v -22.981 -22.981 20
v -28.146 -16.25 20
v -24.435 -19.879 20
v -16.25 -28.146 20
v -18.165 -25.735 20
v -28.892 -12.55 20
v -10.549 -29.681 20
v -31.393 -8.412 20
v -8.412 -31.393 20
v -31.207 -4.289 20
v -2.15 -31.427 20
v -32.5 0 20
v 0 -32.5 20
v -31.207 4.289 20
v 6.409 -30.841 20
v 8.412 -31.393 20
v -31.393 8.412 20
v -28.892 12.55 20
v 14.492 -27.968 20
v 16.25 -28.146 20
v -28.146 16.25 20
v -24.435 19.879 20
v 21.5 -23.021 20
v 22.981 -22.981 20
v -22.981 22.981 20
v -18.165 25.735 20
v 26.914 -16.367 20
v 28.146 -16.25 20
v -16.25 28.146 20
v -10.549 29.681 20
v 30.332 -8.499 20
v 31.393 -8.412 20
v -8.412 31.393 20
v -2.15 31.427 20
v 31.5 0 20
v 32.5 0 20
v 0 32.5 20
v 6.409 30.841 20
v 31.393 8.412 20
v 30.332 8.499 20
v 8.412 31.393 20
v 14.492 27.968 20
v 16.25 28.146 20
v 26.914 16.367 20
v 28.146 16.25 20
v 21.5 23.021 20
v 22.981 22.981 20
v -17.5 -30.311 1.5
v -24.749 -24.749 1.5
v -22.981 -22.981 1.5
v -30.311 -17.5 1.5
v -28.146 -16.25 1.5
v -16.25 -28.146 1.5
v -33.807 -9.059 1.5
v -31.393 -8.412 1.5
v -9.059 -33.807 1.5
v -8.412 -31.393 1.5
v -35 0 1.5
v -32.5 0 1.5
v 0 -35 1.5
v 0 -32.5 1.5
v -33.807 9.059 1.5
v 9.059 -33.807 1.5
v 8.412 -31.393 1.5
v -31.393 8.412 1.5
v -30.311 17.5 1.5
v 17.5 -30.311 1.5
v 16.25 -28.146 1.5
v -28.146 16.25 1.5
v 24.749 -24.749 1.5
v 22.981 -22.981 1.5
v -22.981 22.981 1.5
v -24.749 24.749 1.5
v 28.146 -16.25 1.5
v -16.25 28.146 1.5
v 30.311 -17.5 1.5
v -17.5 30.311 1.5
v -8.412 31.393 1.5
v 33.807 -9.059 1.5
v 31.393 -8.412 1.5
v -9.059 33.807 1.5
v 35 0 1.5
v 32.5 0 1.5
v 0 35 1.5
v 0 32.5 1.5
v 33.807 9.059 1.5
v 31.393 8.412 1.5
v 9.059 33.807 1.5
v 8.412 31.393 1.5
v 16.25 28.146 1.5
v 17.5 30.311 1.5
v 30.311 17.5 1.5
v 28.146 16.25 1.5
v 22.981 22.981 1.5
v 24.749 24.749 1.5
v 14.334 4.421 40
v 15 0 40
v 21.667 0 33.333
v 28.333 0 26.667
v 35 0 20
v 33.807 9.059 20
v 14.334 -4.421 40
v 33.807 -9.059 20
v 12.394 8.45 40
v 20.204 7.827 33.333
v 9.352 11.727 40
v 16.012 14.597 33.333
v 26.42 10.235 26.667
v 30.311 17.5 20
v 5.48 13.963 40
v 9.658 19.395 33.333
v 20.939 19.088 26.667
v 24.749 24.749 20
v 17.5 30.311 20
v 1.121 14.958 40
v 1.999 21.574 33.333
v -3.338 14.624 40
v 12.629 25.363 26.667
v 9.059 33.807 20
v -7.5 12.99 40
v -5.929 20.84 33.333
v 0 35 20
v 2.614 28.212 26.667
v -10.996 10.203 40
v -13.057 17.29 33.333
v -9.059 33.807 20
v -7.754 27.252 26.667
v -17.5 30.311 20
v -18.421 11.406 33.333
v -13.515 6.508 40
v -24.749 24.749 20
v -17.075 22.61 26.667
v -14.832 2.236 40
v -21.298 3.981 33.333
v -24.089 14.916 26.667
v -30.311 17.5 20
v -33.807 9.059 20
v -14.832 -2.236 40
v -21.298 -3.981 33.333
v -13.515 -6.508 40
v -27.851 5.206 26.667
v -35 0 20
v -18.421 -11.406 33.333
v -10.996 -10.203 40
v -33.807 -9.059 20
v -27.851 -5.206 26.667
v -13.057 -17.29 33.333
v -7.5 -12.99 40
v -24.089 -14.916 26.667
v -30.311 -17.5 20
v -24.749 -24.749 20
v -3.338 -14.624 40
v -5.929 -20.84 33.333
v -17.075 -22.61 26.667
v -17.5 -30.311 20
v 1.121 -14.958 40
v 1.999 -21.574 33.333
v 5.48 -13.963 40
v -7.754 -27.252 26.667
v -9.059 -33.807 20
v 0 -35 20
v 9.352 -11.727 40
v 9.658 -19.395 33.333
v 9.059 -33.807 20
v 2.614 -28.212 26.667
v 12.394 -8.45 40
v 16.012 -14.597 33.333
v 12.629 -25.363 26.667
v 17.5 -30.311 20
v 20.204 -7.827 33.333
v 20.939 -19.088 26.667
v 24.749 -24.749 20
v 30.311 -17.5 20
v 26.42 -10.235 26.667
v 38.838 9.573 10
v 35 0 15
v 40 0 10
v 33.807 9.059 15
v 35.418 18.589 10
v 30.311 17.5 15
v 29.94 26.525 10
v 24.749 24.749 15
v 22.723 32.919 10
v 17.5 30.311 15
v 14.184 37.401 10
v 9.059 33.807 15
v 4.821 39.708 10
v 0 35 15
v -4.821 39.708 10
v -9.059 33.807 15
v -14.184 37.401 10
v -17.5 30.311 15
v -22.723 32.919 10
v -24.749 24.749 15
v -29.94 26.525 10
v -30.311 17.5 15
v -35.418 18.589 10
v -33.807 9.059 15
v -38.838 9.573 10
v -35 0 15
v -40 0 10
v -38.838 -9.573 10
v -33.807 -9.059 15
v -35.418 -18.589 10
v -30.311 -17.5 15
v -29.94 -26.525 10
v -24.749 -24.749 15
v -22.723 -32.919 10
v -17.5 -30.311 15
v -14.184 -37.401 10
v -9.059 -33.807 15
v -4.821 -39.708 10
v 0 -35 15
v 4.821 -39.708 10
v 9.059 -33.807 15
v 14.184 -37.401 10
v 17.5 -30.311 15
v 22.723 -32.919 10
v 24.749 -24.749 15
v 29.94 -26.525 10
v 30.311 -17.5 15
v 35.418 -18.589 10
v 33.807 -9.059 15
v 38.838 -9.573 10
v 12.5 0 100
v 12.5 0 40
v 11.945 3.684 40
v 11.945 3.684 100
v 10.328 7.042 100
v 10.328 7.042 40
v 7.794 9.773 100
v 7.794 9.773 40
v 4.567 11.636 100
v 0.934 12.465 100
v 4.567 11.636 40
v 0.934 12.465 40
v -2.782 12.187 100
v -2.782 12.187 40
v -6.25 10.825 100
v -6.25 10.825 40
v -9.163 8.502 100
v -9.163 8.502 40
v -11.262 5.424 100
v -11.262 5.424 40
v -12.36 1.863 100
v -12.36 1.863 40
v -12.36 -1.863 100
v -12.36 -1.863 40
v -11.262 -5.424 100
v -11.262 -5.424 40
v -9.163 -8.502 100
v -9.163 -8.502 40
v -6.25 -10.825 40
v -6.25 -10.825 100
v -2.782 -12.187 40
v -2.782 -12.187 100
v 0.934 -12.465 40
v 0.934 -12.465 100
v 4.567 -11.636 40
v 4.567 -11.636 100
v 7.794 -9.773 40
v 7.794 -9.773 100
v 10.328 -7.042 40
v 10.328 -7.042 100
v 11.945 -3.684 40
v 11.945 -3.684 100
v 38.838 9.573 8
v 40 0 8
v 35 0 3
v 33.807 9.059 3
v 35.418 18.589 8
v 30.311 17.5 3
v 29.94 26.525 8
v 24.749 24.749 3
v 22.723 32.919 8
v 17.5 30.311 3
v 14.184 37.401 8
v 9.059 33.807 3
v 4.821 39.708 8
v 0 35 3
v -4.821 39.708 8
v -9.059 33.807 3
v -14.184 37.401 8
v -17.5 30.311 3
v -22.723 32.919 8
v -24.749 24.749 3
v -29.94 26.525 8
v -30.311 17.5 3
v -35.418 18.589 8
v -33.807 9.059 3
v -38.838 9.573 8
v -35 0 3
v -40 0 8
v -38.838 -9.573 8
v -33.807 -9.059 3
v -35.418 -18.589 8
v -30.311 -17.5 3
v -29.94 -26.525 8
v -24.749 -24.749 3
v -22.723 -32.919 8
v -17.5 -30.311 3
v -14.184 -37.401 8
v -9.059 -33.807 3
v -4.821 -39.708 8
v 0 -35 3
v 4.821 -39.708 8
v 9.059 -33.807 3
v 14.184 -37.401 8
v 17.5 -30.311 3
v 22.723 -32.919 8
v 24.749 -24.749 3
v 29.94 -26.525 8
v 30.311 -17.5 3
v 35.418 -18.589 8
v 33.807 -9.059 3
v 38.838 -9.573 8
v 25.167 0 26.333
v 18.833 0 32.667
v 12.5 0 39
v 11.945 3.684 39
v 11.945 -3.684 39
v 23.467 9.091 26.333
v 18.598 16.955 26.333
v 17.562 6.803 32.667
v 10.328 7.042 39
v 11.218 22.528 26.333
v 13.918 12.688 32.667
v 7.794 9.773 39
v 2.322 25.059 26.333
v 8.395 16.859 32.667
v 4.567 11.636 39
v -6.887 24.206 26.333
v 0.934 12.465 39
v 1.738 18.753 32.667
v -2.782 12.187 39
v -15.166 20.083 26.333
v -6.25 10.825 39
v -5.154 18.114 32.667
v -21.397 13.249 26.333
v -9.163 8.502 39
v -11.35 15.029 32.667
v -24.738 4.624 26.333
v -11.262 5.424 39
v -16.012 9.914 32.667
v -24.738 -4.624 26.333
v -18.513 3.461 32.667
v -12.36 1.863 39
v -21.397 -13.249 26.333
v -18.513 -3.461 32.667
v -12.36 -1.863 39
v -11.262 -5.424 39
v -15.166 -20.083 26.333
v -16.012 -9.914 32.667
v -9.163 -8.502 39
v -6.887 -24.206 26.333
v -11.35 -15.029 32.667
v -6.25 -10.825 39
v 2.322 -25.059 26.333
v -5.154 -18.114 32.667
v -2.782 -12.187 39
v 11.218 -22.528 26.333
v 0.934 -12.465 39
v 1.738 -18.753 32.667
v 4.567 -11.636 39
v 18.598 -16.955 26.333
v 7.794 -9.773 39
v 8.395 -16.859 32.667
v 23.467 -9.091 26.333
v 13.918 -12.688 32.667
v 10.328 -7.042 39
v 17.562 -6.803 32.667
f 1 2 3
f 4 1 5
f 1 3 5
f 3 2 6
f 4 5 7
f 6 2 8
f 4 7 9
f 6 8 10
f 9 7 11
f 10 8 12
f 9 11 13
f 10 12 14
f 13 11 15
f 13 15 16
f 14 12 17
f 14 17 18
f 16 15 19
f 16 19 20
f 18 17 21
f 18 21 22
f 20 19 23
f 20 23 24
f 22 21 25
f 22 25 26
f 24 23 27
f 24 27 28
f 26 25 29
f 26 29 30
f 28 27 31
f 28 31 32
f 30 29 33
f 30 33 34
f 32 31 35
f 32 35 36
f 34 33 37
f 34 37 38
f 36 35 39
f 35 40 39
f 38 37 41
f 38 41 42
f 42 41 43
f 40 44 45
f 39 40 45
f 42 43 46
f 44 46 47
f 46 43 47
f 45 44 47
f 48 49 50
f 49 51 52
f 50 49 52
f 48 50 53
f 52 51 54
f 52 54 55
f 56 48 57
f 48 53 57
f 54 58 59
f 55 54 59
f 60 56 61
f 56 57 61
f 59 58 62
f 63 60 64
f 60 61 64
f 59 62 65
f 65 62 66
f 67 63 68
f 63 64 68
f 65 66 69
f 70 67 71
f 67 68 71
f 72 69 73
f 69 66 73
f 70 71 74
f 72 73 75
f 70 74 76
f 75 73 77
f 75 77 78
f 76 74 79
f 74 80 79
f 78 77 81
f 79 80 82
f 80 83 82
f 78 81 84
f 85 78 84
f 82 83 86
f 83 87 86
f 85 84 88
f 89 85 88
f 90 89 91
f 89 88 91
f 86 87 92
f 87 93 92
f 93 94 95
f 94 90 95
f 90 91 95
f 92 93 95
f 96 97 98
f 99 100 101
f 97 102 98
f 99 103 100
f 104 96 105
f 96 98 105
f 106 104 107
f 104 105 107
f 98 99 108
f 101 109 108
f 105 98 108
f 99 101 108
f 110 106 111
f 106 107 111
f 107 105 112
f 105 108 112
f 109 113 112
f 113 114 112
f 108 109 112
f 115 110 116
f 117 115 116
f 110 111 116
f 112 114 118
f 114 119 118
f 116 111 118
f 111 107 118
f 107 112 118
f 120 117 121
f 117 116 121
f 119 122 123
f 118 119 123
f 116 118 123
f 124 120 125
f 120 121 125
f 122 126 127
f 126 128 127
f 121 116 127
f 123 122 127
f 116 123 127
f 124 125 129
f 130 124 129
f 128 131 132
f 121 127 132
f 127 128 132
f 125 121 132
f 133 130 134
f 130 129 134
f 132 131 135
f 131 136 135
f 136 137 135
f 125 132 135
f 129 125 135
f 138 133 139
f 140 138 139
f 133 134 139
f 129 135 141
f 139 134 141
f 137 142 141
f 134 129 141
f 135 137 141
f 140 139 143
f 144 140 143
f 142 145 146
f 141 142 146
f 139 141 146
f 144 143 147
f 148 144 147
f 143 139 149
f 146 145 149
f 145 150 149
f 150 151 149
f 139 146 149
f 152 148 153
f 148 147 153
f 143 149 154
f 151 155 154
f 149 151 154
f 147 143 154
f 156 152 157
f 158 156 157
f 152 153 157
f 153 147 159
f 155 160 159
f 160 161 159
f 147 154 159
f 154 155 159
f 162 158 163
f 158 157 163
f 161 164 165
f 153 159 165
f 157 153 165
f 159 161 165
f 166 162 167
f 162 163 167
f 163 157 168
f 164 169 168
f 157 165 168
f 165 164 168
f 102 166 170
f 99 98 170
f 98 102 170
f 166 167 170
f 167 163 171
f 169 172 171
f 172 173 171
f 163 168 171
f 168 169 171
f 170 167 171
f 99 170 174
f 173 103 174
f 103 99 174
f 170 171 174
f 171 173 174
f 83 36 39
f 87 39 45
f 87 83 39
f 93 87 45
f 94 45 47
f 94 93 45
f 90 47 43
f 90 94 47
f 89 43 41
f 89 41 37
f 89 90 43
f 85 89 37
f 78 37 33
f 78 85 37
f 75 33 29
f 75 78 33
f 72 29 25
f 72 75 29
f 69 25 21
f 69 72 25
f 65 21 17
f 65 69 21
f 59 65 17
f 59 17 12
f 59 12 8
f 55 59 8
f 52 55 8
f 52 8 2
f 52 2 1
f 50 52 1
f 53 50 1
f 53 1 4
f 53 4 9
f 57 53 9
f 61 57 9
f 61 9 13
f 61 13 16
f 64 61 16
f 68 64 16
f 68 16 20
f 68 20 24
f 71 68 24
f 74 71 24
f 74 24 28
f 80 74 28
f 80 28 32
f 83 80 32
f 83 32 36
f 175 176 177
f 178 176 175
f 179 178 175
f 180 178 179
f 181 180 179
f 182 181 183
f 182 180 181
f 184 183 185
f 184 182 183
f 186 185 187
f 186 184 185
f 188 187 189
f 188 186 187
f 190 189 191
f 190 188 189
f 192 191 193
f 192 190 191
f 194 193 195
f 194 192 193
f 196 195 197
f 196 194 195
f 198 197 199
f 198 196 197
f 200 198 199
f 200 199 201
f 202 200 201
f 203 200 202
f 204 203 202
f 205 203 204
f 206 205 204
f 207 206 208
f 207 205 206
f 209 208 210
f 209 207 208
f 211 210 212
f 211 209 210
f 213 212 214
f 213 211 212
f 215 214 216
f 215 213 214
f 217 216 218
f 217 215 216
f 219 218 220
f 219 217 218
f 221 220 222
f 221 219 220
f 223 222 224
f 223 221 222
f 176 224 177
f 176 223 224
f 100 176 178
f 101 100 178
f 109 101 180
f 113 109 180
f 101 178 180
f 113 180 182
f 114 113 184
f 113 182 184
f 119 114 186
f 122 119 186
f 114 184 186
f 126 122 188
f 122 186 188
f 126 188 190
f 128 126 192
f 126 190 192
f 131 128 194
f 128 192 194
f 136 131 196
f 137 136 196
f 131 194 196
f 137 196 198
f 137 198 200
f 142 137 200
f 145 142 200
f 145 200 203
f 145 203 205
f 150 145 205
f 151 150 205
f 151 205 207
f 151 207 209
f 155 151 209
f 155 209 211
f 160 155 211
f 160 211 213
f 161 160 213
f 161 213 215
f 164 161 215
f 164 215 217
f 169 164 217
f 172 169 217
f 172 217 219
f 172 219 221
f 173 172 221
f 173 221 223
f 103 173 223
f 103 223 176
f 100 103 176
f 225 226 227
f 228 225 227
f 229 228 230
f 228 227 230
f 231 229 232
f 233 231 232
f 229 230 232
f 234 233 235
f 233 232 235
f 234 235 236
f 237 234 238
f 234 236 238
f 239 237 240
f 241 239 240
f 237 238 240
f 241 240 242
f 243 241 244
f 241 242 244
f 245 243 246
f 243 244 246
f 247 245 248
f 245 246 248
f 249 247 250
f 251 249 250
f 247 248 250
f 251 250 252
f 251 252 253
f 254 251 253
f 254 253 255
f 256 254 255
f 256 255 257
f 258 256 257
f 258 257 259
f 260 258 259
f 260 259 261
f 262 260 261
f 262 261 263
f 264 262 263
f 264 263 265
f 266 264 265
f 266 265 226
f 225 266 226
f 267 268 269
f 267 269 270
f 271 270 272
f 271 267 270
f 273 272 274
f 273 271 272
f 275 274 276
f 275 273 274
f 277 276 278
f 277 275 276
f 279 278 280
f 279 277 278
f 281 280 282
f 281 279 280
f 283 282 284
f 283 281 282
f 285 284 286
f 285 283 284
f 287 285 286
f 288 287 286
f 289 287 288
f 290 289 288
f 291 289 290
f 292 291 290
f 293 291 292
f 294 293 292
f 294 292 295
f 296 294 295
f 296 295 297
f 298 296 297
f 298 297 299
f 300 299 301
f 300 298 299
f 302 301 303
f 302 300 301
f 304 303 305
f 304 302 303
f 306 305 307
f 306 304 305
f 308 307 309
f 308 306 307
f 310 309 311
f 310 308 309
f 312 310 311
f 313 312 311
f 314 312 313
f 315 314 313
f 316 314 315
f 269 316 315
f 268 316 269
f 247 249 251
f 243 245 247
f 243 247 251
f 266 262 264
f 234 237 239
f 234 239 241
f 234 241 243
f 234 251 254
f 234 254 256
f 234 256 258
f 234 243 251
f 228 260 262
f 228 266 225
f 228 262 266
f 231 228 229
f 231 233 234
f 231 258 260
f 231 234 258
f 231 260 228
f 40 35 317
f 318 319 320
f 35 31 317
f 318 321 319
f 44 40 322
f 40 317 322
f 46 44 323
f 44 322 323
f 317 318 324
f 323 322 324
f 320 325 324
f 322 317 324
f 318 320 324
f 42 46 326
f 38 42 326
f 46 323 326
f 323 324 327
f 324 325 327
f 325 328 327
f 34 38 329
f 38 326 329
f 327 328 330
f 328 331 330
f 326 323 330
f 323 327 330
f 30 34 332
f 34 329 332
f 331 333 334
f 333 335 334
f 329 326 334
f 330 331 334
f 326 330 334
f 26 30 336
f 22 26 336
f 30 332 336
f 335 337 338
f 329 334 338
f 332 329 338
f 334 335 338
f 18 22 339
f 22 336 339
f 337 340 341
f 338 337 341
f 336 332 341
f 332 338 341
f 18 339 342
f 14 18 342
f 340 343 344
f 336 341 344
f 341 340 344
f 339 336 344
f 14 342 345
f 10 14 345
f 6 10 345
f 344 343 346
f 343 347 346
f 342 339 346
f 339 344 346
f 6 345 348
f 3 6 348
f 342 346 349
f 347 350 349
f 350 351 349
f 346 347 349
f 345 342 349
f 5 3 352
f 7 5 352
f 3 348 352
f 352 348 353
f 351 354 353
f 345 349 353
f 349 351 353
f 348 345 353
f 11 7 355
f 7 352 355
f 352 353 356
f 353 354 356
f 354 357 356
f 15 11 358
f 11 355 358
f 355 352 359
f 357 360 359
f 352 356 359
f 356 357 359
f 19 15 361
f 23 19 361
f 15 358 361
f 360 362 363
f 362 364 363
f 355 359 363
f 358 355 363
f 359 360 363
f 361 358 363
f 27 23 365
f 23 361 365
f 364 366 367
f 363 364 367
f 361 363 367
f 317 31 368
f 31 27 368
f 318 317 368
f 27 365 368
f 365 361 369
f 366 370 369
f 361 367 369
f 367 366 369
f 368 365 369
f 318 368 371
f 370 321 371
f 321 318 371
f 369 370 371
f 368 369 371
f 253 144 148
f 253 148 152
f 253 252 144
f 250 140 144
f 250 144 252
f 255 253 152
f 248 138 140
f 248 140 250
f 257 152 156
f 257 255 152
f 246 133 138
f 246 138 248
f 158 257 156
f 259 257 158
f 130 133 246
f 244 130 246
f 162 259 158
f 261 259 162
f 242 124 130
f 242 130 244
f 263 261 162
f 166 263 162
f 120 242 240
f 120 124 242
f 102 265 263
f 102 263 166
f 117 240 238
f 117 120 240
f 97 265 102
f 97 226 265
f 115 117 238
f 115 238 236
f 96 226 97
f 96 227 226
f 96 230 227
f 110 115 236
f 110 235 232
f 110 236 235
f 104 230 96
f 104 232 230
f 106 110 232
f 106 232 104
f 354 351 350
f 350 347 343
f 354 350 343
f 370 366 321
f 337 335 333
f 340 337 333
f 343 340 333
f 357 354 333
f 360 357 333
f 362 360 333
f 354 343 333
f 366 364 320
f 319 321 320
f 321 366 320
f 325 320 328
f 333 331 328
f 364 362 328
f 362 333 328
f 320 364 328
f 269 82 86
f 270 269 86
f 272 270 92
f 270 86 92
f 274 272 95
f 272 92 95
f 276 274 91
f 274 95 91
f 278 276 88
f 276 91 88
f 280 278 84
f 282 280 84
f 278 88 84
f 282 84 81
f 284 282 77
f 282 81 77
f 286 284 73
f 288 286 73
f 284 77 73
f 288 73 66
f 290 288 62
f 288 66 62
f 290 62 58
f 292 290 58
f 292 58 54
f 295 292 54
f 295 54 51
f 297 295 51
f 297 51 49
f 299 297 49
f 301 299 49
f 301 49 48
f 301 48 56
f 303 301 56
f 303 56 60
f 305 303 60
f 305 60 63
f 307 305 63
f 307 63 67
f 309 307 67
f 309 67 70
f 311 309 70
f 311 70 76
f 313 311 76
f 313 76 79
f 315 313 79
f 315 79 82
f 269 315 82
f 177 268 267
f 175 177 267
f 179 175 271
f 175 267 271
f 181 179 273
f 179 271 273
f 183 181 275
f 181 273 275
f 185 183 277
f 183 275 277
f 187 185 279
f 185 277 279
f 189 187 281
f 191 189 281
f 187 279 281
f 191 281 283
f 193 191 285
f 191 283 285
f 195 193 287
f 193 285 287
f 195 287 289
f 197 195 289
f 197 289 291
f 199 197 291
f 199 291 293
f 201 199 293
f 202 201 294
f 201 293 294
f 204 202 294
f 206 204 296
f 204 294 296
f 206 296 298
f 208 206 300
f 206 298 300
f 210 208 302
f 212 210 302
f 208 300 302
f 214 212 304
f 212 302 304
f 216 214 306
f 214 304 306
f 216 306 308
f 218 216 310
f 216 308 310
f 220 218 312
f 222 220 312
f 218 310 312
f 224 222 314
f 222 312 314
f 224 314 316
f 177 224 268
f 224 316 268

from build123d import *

# Parameters (mm, degrees)
F0_R     = 35
F0_R_2   = 32.5
F1_DEPTH = 40
F2_START = 20
F0_R_3   = 12.5
F2_DEPTH = 20
F3_START = 39
F3_DEPTH = 61
F4_SIZE  = 20
F5_SIZE  = 18.99999
F6_START = 3
F0_R_4   = 40
F6_DEPTH = 12
F7_SIZE  = 4.99999
F8_DEPTH = 1.5


# Not quite as in the source:
# - a fillet or chamfer is up to 0.001 mm smaller than in the source, because OpenCascade refuses the exact size


with BuildPart() as f1:
    # F0 (on Top) → F1 (new body)
    with BuildSketch(Plane.XY):
        Circle(F0_R)
        Circle(F0_R_2, mode=Mode.SUBTRACT)
    extrude(amount=F1_DEPTH)

    # F0 (on Top) → F2 (join)
    with BuildSketch(Plane.XY.offset(F2_START)):
        Circle(F0_R_2)
        Circle(F0_R_3, mode=Mode.SUBTRACT)
    extrude(amount=F2_DEPTH)

    # F0 (on Top) → F3 (join)
    with BuildSketch(Plane.XY.offset(F3_START)):
        Circle(F0_R_3)
    extrude(amount=F3_DEPTH)

    # F4
    f4_edges = [f1.edges().sort_by_distance(p)[0] for p in [
        (-35, 0, 40),
    ]]
    chamfer(f4_edges, length=F4_SIZE)

    # F5 (size 19 in the source; OpenCascade refuses exactly that, so slightly less here)
    f5_edges = [f1.edges().sort_by_distance(p)[0] for p in [
        (-12.5, 0, 20),
    ]]
    chamfer(f5_edges, length=F5_SIZE)

    # F0 (on Top) → F6 (join)
    with BuildSketch(Plane.XY.offset(F6_START)):
        Circle(F0_R_4)
        Circle(F0_R, mode=Mode.SUBTRACT)
    extrude(amount=F6_DEPTH)

    # F7 (size 5 in the source; OpenCascade refuses exactly that, so slightly less here)
    f7_edges = [f1.edges().sort_by_distance(p)[0] for p in [
        (-40, 0, 3),
        (-40, 0, 15),
    ]]
    chamfer(f7_edges, length=F7_SIZE)

    # F8 (cut): a face of the model
    f8_faces = [f1.faces().sort_by_distance(p)[0] for p in [
        (-34.0100505063, 0, 0),
    ]]
    extrude(f8_faces, amount=-F8_DEPTH, mode=Mode.SUBTRACT)


solid = f1.part
